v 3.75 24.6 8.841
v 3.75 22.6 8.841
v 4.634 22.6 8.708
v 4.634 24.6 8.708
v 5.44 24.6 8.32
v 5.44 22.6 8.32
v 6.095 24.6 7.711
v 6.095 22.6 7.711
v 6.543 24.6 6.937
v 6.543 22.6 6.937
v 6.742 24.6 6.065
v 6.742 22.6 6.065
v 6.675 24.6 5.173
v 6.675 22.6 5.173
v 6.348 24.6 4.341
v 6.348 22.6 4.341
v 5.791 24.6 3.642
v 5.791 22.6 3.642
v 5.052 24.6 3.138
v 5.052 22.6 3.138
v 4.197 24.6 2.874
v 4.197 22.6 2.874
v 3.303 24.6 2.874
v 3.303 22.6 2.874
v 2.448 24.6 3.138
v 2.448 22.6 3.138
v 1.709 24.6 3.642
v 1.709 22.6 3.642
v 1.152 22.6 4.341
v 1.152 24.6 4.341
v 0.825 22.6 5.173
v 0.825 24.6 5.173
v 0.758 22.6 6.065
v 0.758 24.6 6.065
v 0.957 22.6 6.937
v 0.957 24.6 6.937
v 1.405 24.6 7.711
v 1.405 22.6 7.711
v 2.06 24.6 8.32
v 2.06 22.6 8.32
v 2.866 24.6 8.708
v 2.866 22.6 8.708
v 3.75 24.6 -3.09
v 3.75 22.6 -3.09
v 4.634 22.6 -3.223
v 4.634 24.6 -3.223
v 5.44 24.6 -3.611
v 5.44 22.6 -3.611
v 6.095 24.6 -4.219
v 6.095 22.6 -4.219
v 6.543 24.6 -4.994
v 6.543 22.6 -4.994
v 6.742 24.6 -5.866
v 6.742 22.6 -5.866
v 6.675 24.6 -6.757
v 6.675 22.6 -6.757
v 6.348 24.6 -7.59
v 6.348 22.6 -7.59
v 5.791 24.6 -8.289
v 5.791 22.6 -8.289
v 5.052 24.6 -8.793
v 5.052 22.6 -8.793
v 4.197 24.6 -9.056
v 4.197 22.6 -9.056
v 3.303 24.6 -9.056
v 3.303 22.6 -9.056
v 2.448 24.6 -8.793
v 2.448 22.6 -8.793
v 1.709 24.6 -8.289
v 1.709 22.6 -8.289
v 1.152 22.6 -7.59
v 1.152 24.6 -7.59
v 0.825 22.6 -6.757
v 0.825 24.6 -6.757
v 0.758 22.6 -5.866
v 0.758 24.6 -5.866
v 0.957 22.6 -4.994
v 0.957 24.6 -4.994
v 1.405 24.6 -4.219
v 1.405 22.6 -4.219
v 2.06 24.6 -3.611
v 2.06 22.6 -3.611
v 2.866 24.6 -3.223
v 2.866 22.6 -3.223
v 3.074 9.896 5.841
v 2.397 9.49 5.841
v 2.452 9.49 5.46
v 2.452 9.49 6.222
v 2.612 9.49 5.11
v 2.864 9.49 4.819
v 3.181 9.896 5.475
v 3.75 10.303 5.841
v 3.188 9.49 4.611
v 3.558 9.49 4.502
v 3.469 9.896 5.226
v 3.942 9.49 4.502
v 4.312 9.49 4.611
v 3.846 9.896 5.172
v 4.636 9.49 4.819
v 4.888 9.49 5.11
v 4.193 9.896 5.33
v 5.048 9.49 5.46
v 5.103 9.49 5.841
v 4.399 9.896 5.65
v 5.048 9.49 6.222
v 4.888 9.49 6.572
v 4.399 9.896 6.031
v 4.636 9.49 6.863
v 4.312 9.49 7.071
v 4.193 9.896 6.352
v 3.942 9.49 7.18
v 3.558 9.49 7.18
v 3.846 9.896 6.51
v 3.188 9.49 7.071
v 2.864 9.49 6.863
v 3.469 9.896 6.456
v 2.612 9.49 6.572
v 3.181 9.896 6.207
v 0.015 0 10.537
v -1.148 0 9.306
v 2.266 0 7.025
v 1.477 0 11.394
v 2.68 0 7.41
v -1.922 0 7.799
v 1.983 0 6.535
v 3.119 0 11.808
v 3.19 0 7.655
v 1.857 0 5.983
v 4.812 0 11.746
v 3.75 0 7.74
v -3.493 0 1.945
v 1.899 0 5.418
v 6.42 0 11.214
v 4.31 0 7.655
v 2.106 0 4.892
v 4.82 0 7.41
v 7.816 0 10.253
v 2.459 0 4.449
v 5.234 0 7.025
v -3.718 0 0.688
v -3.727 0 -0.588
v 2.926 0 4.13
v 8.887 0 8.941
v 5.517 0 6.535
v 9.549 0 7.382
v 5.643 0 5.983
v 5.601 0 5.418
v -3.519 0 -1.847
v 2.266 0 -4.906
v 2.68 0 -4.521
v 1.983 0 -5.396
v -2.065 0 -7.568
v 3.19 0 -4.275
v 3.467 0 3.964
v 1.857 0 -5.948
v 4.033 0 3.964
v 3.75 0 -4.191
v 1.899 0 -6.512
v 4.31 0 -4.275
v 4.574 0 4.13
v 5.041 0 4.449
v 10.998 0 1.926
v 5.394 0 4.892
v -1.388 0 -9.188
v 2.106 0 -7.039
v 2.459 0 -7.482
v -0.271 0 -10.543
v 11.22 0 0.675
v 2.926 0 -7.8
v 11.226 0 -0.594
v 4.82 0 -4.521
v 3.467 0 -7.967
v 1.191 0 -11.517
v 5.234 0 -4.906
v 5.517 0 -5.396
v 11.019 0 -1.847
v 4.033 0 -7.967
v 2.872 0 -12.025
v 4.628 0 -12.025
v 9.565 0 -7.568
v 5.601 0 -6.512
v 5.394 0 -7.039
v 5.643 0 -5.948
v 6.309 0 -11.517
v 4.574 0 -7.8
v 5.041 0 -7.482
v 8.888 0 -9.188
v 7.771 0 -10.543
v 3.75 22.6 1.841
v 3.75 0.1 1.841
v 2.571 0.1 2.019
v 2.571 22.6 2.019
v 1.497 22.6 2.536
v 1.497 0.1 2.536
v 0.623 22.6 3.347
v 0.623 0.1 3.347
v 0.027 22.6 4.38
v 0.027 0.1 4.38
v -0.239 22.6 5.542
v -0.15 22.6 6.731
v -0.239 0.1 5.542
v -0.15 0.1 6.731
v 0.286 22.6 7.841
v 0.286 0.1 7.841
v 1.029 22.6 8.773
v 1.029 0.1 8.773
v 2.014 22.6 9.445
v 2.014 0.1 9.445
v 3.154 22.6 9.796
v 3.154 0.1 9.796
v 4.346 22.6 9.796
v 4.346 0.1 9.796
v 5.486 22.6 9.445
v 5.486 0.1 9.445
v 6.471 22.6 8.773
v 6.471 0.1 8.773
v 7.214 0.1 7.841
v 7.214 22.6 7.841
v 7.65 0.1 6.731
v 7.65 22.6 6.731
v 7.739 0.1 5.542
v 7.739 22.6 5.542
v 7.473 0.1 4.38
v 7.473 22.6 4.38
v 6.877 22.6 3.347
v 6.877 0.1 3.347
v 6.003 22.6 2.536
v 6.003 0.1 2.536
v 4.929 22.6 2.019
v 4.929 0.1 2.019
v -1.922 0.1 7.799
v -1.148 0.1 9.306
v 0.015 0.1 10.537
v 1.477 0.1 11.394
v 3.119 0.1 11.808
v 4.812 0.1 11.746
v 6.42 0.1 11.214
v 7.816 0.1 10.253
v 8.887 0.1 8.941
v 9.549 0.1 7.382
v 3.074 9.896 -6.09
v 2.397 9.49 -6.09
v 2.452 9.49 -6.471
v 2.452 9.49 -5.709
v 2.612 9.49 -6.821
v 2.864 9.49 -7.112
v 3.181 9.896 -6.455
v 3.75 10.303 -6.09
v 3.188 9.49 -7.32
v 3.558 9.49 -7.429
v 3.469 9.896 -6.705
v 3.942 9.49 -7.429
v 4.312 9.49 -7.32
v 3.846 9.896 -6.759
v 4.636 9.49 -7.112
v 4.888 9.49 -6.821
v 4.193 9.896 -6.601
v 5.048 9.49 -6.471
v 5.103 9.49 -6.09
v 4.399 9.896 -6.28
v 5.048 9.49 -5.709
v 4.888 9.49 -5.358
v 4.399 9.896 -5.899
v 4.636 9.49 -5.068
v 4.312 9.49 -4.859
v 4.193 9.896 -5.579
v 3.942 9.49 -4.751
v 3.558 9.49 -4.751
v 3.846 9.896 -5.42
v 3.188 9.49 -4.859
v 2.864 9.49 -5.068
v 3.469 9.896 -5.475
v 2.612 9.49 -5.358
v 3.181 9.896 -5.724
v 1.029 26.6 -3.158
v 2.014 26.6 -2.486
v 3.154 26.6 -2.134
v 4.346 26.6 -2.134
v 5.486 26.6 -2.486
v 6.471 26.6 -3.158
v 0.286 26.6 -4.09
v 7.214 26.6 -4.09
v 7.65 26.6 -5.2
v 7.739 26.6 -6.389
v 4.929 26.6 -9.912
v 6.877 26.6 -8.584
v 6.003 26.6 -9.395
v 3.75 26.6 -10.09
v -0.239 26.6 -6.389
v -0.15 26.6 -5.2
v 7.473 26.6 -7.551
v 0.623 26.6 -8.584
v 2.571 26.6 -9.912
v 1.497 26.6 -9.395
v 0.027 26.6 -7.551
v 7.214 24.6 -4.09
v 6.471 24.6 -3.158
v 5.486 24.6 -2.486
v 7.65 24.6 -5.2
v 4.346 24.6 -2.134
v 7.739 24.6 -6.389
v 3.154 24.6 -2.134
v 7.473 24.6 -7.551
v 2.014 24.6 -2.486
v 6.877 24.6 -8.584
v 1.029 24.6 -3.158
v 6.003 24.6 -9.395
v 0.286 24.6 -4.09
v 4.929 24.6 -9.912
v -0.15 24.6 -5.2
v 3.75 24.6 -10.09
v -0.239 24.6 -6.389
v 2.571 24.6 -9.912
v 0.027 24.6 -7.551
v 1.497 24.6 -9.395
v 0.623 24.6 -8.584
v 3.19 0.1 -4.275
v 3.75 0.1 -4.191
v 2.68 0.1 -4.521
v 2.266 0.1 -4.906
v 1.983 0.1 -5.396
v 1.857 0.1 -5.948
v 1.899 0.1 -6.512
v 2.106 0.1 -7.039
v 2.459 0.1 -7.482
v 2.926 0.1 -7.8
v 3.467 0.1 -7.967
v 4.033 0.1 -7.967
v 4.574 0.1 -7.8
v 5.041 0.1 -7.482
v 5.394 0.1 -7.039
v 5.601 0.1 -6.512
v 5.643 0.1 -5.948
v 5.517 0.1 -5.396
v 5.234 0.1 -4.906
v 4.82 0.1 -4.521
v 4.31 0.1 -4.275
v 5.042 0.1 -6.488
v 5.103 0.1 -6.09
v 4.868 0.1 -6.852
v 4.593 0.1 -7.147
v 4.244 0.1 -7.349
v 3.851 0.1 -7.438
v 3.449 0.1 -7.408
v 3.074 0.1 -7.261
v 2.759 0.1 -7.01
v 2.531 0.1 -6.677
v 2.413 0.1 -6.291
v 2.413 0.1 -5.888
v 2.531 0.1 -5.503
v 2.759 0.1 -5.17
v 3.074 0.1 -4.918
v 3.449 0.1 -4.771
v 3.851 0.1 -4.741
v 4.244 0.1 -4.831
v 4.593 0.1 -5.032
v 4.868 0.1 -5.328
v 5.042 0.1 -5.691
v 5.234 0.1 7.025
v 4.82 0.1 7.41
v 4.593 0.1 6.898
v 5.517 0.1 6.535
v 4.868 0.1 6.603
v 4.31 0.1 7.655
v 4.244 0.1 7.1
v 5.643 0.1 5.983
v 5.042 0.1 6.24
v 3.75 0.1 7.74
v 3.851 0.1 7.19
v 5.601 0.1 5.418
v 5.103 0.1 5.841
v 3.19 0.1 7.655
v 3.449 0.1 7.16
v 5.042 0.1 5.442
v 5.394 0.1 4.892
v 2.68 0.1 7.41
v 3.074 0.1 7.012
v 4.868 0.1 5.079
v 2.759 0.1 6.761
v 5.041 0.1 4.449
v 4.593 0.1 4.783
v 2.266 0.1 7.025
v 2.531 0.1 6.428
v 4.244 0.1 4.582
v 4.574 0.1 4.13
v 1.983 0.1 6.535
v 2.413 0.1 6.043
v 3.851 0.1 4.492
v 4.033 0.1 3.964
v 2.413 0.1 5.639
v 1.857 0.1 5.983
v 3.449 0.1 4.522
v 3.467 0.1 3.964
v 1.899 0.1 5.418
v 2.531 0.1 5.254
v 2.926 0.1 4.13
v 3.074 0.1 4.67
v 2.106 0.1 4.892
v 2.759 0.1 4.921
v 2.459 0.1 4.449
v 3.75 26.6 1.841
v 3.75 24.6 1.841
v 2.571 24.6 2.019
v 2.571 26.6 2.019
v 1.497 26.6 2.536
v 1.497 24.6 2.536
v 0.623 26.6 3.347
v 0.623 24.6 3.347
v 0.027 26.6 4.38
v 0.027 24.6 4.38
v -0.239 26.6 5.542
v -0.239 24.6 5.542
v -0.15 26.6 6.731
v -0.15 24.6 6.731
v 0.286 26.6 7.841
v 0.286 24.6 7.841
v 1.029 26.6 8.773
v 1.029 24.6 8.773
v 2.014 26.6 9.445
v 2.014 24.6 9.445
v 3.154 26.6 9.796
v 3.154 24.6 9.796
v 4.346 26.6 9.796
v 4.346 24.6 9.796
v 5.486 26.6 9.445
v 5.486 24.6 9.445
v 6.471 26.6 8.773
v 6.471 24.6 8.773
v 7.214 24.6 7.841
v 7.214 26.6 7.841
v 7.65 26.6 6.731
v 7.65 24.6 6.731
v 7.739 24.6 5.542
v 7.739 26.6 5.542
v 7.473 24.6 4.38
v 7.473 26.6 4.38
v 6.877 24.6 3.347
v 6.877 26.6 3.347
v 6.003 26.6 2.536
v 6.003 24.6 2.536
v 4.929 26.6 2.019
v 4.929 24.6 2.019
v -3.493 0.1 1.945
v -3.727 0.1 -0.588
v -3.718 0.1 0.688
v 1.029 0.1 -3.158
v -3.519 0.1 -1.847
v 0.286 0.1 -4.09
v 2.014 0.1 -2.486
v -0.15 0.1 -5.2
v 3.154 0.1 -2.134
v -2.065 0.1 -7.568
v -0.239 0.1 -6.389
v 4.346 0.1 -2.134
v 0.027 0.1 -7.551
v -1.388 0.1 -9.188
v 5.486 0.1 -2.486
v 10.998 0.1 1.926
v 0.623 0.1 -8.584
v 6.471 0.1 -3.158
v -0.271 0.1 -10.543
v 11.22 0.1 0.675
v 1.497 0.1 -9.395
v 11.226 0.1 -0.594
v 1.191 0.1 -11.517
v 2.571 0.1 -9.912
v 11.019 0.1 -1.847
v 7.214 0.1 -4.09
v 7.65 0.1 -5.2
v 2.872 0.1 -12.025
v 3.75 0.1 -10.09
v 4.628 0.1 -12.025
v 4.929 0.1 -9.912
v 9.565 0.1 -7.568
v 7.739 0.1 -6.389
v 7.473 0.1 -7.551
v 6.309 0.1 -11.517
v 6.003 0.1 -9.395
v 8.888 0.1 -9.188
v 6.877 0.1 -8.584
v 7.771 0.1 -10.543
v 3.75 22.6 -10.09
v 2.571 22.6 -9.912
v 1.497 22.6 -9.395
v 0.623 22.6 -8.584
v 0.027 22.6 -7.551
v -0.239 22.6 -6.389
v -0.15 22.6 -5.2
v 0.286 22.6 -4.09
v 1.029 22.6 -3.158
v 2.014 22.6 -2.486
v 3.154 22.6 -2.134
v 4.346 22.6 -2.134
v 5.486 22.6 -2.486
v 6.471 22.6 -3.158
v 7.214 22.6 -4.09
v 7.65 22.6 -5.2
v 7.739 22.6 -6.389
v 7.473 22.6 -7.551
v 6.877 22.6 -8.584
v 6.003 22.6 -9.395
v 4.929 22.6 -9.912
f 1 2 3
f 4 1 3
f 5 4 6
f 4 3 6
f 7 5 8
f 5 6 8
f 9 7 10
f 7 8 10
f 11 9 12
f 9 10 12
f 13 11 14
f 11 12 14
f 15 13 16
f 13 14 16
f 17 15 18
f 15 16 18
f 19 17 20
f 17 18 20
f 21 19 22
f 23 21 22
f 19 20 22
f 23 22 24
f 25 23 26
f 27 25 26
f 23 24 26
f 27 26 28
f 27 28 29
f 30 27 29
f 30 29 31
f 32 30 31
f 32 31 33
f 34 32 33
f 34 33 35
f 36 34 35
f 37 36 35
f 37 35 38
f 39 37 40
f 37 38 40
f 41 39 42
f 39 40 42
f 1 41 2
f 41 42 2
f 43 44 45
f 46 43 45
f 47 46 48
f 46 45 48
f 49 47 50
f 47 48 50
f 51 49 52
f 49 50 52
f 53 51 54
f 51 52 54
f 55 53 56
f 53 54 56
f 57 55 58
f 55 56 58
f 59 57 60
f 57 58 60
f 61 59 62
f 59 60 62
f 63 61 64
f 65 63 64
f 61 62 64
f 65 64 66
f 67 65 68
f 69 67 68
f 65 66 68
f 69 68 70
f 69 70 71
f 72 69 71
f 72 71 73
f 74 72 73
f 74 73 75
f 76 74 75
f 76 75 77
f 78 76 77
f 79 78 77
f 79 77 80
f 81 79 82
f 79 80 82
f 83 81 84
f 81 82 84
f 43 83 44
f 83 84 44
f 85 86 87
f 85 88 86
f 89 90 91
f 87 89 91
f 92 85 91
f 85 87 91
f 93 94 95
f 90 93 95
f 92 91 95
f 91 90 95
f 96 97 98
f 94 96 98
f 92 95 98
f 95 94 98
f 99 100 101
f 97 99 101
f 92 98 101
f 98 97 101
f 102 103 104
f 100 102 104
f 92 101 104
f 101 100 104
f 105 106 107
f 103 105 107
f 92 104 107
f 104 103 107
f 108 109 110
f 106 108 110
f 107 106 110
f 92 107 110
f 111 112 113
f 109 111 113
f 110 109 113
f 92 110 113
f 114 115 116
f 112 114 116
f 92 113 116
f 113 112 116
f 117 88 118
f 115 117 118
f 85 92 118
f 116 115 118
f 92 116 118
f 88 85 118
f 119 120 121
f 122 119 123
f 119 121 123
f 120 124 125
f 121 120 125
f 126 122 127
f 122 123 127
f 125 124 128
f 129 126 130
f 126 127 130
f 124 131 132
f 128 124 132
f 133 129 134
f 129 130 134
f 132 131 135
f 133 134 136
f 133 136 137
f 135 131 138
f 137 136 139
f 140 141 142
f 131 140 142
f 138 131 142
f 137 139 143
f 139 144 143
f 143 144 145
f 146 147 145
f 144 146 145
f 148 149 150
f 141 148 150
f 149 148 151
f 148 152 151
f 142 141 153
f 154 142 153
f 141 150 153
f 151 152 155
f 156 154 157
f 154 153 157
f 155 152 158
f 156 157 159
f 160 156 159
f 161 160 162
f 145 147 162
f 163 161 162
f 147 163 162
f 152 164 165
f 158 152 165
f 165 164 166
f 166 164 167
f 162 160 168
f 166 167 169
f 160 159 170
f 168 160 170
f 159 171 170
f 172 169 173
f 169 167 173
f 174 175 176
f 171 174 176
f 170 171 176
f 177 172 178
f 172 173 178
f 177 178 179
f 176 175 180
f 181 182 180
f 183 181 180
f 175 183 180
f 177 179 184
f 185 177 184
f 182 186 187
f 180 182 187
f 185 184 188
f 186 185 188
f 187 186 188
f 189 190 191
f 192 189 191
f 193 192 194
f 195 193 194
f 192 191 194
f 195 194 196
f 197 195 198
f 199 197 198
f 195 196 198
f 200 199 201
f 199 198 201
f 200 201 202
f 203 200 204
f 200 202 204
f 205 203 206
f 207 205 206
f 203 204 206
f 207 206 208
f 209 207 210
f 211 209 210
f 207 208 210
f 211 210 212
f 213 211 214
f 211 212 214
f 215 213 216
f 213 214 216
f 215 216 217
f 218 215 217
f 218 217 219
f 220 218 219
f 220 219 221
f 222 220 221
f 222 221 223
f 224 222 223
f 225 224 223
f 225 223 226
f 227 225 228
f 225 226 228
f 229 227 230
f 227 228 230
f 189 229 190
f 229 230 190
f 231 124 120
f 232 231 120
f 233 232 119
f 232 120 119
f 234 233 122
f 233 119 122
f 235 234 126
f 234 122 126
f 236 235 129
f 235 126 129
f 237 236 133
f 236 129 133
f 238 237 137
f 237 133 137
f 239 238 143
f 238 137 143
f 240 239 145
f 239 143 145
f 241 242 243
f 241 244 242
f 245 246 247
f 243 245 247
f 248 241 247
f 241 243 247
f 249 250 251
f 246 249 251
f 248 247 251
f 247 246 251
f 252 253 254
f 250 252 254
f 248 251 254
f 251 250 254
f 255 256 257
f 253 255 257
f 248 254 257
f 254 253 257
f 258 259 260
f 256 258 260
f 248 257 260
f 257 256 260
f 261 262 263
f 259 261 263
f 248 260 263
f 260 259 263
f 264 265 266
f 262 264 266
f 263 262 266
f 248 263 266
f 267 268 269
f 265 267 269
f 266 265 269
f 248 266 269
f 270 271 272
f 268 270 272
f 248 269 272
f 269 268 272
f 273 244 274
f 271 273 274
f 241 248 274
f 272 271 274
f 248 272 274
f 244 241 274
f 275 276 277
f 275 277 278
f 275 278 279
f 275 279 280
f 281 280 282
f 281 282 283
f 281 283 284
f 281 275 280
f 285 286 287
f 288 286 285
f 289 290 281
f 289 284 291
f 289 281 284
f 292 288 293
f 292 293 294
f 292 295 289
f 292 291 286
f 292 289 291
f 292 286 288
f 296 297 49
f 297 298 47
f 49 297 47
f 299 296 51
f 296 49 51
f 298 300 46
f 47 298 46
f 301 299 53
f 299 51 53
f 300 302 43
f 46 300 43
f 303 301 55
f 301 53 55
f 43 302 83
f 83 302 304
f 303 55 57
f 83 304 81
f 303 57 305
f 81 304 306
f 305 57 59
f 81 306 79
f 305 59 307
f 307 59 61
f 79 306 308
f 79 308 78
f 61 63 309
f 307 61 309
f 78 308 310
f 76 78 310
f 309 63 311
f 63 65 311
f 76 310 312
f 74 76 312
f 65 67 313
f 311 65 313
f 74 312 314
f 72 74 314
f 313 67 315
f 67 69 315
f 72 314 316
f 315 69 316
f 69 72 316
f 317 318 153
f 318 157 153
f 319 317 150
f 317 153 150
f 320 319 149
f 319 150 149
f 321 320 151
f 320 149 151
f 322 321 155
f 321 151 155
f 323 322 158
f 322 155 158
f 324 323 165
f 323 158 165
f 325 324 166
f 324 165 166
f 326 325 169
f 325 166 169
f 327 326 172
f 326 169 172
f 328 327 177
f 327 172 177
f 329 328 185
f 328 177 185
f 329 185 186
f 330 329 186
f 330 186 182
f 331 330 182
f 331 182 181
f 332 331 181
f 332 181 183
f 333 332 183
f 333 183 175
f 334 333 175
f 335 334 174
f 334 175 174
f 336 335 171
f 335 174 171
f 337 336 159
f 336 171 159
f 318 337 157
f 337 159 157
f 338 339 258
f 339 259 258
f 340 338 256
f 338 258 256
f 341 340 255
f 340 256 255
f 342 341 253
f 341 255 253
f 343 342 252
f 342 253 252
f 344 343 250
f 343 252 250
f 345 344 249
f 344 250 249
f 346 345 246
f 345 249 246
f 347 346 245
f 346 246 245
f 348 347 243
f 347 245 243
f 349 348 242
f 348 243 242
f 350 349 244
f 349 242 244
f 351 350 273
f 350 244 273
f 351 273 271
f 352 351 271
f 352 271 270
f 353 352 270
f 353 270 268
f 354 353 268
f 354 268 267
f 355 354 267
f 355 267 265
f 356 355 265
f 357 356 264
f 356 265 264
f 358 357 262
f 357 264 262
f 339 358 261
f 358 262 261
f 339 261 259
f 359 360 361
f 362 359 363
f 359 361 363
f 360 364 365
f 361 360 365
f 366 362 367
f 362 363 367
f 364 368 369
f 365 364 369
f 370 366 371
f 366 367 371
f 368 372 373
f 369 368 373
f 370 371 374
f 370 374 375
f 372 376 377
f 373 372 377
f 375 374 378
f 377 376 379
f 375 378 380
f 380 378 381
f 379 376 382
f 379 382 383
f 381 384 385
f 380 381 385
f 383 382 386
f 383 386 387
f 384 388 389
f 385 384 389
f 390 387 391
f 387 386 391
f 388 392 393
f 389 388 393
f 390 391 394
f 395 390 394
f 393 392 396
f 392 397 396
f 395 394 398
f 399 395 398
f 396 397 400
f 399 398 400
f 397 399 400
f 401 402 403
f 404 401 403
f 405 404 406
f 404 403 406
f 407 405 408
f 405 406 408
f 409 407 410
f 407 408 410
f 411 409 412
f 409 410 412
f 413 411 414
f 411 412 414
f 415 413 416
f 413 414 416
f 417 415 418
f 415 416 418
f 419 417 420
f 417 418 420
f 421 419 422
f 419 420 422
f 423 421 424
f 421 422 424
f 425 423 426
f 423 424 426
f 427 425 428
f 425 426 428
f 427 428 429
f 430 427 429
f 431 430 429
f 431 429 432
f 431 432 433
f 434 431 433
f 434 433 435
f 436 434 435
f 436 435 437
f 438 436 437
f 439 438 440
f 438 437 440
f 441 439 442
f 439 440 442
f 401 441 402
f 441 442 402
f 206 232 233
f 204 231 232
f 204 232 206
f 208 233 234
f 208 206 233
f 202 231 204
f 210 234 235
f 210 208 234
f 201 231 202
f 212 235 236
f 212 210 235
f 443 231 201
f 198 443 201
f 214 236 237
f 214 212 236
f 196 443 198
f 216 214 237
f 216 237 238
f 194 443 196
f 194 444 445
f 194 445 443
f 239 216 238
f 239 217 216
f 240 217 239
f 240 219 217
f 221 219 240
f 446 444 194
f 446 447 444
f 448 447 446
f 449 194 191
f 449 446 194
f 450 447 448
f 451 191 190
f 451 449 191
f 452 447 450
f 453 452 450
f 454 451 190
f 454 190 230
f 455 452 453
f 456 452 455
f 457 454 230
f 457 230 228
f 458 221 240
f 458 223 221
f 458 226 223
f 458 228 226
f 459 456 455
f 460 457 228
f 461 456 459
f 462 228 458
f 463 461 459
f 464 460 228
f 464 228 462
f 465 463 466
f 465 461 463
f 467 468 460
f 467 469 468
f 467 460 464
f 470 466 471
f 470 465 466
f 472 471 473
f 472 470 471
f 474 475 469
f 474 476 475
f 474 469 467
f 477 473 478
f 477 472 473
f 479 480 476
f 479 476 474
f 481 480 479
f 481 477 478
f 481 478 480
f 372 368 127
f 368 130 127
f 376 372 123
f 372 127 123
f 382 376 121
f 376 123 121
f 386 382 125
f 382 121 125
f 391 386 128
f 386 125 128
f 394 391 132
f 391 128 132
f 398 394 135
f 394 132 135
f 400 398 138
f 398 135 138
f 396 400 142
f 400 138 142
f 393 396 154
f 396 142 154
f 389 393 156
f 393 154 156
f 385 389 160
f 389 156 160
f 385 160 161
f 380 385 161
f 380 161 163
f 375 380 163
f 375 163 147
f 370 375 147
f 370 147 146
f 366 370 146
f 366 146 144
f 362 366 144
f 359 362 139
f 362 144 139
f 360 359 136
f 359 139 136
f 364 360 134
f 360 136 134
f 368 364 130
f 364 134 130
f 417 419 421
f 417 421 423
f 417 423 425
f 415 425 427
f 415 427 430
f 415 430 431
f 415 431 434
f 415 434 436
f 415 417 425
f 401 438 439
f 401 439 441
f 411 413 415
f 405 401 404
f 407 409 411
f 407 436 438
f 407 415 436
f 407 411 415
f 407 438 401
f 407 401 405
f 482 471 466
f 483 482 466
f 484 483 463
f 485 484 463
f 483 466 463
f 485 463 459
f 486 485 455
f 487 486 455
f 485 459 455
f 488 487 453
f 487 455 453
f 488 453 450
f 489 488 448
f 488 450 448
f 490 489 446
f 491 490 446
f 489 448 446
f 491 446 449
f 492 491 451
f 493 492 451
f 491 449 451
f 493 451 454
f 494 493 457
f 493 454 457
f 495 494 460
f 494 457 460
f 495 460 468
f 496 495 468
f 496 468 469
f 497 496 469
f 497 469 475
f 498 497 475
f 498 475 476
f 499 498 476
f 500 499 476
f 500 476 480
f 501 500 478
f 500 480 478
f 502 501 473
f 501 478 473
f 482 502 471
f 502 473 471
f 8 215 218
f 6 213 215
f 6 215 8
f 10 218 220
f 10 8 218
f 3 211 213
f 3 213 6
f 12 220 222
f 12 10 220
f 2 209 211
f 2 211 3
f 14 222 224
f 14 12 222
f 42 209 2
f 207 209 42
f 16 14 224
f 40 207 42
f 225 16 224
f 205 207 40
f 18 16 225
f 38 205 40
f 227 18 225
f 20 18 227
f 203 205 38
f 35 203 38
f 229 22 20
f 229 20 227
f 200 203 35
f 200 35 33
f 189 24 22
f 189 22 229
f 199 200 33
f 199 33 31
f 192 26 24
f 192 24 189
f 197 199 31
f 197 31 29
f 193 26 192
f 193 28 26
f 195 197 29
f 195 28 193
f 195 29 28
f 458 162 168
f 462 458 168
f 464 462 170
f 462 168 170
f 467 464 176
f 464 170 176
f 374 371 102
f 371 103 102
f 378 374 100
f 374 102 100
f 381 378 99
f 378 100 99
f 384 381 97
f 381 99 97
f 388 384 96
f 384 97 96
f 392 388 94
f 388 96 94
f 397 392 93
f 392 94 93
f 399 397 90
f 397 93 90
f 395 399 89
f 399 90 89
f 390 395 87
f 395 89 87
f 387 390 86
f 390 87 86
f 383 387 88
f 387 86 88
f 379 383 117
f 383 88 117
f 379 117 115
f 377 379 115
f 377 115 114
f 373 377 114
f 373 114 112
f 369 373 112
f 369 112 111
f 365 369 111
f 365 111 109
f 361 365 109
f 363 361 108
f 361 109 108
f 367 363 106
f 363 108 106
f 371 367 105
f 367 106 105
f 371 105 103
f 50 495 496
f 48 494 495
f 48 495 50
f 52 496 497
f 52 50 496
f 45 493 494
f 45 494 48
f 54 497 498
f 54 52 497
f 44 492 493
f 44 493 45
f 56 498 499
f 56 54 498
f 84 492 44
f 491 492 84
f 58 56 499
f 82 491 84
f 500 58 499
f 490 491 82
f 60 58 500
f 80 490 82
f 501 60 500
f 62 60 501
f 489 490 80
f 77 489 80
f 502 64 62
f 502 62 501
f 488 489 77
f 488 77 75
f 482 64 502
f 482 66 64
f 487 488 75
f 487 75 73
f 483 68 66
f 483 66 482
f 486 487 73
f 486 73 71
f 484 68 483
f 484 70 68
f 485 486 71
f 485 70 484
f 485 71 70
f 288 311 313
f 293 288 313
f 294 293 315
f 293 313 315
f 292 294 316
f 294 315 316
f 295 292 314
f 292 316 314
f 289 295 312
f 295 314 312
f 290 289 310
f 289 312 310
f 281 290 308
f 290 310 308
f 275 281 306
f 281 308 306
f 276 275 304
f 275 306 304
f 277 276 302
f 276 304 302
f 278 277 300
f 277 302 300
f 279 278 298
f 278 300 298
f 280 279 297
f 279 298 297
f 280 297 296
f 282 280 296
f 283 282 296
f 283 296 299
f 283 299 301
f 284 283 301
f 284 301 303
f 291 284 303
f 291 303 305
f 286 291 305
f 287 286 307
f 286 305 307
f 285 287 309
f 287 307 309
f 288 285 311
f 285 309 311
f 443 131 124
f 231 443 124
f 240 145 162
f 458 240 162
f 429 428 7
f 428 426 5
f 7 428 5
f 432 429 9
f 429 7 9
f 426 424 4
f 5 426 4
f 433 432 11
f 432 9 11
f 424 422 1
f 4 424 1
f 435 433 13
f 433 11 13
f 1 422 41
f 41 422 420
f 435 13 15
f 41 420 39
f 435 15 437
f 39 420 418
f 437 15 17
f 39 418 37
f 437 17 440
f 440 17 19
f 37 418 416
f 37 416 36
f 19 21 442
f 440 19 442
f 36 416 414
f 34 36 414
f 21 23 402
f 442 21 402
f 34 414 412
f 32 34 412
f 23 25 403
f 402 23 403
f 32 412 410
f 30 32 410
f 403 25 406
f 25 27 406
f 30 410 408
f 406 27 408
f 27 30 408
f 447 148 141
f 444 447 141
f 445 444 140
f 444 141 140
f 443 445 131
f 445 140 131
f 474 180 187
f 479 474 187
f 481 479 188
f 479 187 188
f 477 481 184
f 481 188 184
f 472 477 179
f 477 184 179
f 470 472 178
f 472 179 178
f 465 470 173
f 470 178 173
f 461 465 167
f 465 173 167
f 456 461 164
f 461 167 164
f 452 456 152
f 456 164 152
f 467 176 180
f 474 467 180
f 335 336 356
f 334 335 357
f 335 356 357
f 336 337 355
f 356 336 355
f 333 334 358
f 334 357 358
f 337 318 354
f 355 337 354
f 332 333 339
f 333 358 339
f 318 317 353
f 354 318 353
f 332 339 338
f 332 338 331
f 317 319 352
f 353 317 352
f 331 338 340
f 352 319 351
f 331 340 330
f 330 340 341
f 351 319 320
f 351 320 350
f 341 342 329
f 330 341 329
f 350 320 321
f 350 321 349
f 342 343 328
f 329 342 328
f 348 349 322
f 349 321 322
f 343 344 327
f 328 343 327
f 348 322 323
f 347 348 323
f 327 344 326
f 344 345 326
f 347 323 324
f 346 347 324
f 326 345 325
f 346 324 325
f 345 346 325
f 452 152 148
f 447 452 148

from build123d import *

# Parameters (mm, degrees)
BOSS_EXTRUDE2_DEPTH            = 0.1
SKETCH3_R                      = 4
BOSS_EXTRUDE3_DEPTH            = 22.5
SKETCH4_R                      = 3
BOSS_EXTRUDE4_DEPTH            = 2
SKETCH5_R                      = 4
BOSS_EXTRUDE5_DEPTH            = 2
SKETCH7_W                      = 1.89865
SKETCH7_H                      = 0.1
F_6_CLEARANCE_HOLE1_AT_2_COUNT = 2
F_6_CLEARANCE_HOLE1_AT_2_PITCH = 11.930689284
F_6_32_TAPPED_HOLE1_D          = 2.7051
F_6_32_TAPPED_HOLE1_DEPTH      = 9.39
F_6_32_TAPPED_HOLE1_TIP        = 0.81269403


with BuildPart() as part:
    # Sketch2 → Boss-Extrude2 (new body)
    with BuildSketch(Plane(origin=(0, 0, 0), x_dir=(1, 0, 0), z_dir=(0, 1, 0))):
        with BuildLine():
            ThreePointArc((-1.921673483, -7.798539123), (3.967844549, -11.837003018), (9.548776015, -7.381801872))
            Line((9.548776015, -7.381801872), (10.998470019, -1.926053578))
            ThreePointArc((10.998470019, -1.926053578), (11.24988985, -0.04064778), (11.018921171, 1.84737246))
            Line((11.018921171, 1.84737246), (9.565136937, 7.567628243))
            ThreePointArc((9.565136937, 7.567628243), (3.75, 12.089730275), (-2.065136937, 7.567628243))
            Line((-2.065136937, 7.567628243), (-3.518921171, 1.84737246))
            ThreePointArc((-3.518921171, 1.84737246), (-3.749830525, -0.050419155), (-3.493426606, -1.944934706))
            Line((-3.493426606, -1.944934706), (-1.921673483, -7.798539123))
        make_face()
    extrude(amount=BOSS_EXTRUDE2_DEPTH)

    # Sketch3 → Boss-Extrude3 (add)
    with BuildSketch(Plane(origin=(0, 0.1, 0), x_dir=(1, 0, 0), z_dir=(0, 1, 0))):
        with Locations(Location((3.75, -5.840959009, 0), (0, 0, 90))):
            Circle(SKETCH3_R)
        with Locations(Location((3.75, 6.089730275, 0), (0, 0, 90))):
            Circle(SKETCH3_R)
    extrude(amount=BOSS_EXTRUDE3_DEPTH)

    # Sketch4 → Boss-Extrude4 (add)
    with BuildSketch(Plane(origin=(0, 22.6, 0), x_dir=(1, 0, 0), z_dir=(0, 1, 0))):
        with Locations(Location((3.75, -5.840959009, 0), (0, 0, 270))):
            Circle(SKETCH4_R)
        with Locations(Location((3.75, 6.089730275, 0), (0, 0, 270))):
            Circle(SKETCH4_R)
    extrude(amount=BOSS_EXTRUDE4_DEPTH)

    # Sketch5 → Boss-Extrude5 (add)
    with BuildSketch(Plane(origin=(0, 24.6, 0), x_dir=(1, 0, 0), z_dir=(0, 1, 0))):
        with Locations(Location((3.75, -5.840959009, 0), (0, 0, 90))):
            Circle(SKETCH5_R)
        with Locations(Location((3.75, 6.089730275, 0), (0, 0, 90))):
            Circle(SKETCH5_R)
    extrude(amount=BOSS_EXTRUDE5_DEPTH)

    # Sketch7 → #6 Clearance Hole1 (revolve, cut)
    with BuildSketch(Plane(origin=(3.75, 0.1, -6.089730275), x_dir=(0, 0, 1), z_dir=(1, 0, 0))):
        with Locations((0.949325, 0.05)):
            Rectangle(SKETCH7_W, SKETCH7_H)
    f_6_clearance_hole1 = revolve(axis=Axis((3.75, 6.45, -6.089730275), (0, -1, 0)), mode=Mode.SUBTRACT)

    # #6 Clearance Hole1 at 2: #6 Clearance Hole1 ×2
    with Locations(*[(0, 0, i * F_6_CLEARANCE_HOLE1_AT_2_PITCH) for i in range(1, F_6_CLEARANCE_HOLE1_AT_2_COUNT)]):
        add(f_6_clearance_hole1, mode=Mode.SUBTRACT)

    # #6-32 Tapped Hole1
    with Locations(Plane(origin=(0, 0.1, 0), x_dir=(-1, 0, 0), z_dir=(0, -1, 0))):
        with Locations((-3.75, -5.840959009), (-3.75, 6.089730275)):
            Hole(F_6_32_TAPPED_HOLE1_D / 2, depth=F_6_32_TAPPED_HOLE1_DEPTH)
            with Locations((0, 0, -(F_6_32_TAPPED_HOLE1_DEPTH + F_6_32_TAPPED_HOLE1_TIP / 2))):  # 118° drill point
                Cone(0, F_6_32_TAPPED_HOLE1_D / 2, F_6_32_TAPPED_HOLE1_TIP, mode=Mode.SUBTRACT)


solid = part.part
